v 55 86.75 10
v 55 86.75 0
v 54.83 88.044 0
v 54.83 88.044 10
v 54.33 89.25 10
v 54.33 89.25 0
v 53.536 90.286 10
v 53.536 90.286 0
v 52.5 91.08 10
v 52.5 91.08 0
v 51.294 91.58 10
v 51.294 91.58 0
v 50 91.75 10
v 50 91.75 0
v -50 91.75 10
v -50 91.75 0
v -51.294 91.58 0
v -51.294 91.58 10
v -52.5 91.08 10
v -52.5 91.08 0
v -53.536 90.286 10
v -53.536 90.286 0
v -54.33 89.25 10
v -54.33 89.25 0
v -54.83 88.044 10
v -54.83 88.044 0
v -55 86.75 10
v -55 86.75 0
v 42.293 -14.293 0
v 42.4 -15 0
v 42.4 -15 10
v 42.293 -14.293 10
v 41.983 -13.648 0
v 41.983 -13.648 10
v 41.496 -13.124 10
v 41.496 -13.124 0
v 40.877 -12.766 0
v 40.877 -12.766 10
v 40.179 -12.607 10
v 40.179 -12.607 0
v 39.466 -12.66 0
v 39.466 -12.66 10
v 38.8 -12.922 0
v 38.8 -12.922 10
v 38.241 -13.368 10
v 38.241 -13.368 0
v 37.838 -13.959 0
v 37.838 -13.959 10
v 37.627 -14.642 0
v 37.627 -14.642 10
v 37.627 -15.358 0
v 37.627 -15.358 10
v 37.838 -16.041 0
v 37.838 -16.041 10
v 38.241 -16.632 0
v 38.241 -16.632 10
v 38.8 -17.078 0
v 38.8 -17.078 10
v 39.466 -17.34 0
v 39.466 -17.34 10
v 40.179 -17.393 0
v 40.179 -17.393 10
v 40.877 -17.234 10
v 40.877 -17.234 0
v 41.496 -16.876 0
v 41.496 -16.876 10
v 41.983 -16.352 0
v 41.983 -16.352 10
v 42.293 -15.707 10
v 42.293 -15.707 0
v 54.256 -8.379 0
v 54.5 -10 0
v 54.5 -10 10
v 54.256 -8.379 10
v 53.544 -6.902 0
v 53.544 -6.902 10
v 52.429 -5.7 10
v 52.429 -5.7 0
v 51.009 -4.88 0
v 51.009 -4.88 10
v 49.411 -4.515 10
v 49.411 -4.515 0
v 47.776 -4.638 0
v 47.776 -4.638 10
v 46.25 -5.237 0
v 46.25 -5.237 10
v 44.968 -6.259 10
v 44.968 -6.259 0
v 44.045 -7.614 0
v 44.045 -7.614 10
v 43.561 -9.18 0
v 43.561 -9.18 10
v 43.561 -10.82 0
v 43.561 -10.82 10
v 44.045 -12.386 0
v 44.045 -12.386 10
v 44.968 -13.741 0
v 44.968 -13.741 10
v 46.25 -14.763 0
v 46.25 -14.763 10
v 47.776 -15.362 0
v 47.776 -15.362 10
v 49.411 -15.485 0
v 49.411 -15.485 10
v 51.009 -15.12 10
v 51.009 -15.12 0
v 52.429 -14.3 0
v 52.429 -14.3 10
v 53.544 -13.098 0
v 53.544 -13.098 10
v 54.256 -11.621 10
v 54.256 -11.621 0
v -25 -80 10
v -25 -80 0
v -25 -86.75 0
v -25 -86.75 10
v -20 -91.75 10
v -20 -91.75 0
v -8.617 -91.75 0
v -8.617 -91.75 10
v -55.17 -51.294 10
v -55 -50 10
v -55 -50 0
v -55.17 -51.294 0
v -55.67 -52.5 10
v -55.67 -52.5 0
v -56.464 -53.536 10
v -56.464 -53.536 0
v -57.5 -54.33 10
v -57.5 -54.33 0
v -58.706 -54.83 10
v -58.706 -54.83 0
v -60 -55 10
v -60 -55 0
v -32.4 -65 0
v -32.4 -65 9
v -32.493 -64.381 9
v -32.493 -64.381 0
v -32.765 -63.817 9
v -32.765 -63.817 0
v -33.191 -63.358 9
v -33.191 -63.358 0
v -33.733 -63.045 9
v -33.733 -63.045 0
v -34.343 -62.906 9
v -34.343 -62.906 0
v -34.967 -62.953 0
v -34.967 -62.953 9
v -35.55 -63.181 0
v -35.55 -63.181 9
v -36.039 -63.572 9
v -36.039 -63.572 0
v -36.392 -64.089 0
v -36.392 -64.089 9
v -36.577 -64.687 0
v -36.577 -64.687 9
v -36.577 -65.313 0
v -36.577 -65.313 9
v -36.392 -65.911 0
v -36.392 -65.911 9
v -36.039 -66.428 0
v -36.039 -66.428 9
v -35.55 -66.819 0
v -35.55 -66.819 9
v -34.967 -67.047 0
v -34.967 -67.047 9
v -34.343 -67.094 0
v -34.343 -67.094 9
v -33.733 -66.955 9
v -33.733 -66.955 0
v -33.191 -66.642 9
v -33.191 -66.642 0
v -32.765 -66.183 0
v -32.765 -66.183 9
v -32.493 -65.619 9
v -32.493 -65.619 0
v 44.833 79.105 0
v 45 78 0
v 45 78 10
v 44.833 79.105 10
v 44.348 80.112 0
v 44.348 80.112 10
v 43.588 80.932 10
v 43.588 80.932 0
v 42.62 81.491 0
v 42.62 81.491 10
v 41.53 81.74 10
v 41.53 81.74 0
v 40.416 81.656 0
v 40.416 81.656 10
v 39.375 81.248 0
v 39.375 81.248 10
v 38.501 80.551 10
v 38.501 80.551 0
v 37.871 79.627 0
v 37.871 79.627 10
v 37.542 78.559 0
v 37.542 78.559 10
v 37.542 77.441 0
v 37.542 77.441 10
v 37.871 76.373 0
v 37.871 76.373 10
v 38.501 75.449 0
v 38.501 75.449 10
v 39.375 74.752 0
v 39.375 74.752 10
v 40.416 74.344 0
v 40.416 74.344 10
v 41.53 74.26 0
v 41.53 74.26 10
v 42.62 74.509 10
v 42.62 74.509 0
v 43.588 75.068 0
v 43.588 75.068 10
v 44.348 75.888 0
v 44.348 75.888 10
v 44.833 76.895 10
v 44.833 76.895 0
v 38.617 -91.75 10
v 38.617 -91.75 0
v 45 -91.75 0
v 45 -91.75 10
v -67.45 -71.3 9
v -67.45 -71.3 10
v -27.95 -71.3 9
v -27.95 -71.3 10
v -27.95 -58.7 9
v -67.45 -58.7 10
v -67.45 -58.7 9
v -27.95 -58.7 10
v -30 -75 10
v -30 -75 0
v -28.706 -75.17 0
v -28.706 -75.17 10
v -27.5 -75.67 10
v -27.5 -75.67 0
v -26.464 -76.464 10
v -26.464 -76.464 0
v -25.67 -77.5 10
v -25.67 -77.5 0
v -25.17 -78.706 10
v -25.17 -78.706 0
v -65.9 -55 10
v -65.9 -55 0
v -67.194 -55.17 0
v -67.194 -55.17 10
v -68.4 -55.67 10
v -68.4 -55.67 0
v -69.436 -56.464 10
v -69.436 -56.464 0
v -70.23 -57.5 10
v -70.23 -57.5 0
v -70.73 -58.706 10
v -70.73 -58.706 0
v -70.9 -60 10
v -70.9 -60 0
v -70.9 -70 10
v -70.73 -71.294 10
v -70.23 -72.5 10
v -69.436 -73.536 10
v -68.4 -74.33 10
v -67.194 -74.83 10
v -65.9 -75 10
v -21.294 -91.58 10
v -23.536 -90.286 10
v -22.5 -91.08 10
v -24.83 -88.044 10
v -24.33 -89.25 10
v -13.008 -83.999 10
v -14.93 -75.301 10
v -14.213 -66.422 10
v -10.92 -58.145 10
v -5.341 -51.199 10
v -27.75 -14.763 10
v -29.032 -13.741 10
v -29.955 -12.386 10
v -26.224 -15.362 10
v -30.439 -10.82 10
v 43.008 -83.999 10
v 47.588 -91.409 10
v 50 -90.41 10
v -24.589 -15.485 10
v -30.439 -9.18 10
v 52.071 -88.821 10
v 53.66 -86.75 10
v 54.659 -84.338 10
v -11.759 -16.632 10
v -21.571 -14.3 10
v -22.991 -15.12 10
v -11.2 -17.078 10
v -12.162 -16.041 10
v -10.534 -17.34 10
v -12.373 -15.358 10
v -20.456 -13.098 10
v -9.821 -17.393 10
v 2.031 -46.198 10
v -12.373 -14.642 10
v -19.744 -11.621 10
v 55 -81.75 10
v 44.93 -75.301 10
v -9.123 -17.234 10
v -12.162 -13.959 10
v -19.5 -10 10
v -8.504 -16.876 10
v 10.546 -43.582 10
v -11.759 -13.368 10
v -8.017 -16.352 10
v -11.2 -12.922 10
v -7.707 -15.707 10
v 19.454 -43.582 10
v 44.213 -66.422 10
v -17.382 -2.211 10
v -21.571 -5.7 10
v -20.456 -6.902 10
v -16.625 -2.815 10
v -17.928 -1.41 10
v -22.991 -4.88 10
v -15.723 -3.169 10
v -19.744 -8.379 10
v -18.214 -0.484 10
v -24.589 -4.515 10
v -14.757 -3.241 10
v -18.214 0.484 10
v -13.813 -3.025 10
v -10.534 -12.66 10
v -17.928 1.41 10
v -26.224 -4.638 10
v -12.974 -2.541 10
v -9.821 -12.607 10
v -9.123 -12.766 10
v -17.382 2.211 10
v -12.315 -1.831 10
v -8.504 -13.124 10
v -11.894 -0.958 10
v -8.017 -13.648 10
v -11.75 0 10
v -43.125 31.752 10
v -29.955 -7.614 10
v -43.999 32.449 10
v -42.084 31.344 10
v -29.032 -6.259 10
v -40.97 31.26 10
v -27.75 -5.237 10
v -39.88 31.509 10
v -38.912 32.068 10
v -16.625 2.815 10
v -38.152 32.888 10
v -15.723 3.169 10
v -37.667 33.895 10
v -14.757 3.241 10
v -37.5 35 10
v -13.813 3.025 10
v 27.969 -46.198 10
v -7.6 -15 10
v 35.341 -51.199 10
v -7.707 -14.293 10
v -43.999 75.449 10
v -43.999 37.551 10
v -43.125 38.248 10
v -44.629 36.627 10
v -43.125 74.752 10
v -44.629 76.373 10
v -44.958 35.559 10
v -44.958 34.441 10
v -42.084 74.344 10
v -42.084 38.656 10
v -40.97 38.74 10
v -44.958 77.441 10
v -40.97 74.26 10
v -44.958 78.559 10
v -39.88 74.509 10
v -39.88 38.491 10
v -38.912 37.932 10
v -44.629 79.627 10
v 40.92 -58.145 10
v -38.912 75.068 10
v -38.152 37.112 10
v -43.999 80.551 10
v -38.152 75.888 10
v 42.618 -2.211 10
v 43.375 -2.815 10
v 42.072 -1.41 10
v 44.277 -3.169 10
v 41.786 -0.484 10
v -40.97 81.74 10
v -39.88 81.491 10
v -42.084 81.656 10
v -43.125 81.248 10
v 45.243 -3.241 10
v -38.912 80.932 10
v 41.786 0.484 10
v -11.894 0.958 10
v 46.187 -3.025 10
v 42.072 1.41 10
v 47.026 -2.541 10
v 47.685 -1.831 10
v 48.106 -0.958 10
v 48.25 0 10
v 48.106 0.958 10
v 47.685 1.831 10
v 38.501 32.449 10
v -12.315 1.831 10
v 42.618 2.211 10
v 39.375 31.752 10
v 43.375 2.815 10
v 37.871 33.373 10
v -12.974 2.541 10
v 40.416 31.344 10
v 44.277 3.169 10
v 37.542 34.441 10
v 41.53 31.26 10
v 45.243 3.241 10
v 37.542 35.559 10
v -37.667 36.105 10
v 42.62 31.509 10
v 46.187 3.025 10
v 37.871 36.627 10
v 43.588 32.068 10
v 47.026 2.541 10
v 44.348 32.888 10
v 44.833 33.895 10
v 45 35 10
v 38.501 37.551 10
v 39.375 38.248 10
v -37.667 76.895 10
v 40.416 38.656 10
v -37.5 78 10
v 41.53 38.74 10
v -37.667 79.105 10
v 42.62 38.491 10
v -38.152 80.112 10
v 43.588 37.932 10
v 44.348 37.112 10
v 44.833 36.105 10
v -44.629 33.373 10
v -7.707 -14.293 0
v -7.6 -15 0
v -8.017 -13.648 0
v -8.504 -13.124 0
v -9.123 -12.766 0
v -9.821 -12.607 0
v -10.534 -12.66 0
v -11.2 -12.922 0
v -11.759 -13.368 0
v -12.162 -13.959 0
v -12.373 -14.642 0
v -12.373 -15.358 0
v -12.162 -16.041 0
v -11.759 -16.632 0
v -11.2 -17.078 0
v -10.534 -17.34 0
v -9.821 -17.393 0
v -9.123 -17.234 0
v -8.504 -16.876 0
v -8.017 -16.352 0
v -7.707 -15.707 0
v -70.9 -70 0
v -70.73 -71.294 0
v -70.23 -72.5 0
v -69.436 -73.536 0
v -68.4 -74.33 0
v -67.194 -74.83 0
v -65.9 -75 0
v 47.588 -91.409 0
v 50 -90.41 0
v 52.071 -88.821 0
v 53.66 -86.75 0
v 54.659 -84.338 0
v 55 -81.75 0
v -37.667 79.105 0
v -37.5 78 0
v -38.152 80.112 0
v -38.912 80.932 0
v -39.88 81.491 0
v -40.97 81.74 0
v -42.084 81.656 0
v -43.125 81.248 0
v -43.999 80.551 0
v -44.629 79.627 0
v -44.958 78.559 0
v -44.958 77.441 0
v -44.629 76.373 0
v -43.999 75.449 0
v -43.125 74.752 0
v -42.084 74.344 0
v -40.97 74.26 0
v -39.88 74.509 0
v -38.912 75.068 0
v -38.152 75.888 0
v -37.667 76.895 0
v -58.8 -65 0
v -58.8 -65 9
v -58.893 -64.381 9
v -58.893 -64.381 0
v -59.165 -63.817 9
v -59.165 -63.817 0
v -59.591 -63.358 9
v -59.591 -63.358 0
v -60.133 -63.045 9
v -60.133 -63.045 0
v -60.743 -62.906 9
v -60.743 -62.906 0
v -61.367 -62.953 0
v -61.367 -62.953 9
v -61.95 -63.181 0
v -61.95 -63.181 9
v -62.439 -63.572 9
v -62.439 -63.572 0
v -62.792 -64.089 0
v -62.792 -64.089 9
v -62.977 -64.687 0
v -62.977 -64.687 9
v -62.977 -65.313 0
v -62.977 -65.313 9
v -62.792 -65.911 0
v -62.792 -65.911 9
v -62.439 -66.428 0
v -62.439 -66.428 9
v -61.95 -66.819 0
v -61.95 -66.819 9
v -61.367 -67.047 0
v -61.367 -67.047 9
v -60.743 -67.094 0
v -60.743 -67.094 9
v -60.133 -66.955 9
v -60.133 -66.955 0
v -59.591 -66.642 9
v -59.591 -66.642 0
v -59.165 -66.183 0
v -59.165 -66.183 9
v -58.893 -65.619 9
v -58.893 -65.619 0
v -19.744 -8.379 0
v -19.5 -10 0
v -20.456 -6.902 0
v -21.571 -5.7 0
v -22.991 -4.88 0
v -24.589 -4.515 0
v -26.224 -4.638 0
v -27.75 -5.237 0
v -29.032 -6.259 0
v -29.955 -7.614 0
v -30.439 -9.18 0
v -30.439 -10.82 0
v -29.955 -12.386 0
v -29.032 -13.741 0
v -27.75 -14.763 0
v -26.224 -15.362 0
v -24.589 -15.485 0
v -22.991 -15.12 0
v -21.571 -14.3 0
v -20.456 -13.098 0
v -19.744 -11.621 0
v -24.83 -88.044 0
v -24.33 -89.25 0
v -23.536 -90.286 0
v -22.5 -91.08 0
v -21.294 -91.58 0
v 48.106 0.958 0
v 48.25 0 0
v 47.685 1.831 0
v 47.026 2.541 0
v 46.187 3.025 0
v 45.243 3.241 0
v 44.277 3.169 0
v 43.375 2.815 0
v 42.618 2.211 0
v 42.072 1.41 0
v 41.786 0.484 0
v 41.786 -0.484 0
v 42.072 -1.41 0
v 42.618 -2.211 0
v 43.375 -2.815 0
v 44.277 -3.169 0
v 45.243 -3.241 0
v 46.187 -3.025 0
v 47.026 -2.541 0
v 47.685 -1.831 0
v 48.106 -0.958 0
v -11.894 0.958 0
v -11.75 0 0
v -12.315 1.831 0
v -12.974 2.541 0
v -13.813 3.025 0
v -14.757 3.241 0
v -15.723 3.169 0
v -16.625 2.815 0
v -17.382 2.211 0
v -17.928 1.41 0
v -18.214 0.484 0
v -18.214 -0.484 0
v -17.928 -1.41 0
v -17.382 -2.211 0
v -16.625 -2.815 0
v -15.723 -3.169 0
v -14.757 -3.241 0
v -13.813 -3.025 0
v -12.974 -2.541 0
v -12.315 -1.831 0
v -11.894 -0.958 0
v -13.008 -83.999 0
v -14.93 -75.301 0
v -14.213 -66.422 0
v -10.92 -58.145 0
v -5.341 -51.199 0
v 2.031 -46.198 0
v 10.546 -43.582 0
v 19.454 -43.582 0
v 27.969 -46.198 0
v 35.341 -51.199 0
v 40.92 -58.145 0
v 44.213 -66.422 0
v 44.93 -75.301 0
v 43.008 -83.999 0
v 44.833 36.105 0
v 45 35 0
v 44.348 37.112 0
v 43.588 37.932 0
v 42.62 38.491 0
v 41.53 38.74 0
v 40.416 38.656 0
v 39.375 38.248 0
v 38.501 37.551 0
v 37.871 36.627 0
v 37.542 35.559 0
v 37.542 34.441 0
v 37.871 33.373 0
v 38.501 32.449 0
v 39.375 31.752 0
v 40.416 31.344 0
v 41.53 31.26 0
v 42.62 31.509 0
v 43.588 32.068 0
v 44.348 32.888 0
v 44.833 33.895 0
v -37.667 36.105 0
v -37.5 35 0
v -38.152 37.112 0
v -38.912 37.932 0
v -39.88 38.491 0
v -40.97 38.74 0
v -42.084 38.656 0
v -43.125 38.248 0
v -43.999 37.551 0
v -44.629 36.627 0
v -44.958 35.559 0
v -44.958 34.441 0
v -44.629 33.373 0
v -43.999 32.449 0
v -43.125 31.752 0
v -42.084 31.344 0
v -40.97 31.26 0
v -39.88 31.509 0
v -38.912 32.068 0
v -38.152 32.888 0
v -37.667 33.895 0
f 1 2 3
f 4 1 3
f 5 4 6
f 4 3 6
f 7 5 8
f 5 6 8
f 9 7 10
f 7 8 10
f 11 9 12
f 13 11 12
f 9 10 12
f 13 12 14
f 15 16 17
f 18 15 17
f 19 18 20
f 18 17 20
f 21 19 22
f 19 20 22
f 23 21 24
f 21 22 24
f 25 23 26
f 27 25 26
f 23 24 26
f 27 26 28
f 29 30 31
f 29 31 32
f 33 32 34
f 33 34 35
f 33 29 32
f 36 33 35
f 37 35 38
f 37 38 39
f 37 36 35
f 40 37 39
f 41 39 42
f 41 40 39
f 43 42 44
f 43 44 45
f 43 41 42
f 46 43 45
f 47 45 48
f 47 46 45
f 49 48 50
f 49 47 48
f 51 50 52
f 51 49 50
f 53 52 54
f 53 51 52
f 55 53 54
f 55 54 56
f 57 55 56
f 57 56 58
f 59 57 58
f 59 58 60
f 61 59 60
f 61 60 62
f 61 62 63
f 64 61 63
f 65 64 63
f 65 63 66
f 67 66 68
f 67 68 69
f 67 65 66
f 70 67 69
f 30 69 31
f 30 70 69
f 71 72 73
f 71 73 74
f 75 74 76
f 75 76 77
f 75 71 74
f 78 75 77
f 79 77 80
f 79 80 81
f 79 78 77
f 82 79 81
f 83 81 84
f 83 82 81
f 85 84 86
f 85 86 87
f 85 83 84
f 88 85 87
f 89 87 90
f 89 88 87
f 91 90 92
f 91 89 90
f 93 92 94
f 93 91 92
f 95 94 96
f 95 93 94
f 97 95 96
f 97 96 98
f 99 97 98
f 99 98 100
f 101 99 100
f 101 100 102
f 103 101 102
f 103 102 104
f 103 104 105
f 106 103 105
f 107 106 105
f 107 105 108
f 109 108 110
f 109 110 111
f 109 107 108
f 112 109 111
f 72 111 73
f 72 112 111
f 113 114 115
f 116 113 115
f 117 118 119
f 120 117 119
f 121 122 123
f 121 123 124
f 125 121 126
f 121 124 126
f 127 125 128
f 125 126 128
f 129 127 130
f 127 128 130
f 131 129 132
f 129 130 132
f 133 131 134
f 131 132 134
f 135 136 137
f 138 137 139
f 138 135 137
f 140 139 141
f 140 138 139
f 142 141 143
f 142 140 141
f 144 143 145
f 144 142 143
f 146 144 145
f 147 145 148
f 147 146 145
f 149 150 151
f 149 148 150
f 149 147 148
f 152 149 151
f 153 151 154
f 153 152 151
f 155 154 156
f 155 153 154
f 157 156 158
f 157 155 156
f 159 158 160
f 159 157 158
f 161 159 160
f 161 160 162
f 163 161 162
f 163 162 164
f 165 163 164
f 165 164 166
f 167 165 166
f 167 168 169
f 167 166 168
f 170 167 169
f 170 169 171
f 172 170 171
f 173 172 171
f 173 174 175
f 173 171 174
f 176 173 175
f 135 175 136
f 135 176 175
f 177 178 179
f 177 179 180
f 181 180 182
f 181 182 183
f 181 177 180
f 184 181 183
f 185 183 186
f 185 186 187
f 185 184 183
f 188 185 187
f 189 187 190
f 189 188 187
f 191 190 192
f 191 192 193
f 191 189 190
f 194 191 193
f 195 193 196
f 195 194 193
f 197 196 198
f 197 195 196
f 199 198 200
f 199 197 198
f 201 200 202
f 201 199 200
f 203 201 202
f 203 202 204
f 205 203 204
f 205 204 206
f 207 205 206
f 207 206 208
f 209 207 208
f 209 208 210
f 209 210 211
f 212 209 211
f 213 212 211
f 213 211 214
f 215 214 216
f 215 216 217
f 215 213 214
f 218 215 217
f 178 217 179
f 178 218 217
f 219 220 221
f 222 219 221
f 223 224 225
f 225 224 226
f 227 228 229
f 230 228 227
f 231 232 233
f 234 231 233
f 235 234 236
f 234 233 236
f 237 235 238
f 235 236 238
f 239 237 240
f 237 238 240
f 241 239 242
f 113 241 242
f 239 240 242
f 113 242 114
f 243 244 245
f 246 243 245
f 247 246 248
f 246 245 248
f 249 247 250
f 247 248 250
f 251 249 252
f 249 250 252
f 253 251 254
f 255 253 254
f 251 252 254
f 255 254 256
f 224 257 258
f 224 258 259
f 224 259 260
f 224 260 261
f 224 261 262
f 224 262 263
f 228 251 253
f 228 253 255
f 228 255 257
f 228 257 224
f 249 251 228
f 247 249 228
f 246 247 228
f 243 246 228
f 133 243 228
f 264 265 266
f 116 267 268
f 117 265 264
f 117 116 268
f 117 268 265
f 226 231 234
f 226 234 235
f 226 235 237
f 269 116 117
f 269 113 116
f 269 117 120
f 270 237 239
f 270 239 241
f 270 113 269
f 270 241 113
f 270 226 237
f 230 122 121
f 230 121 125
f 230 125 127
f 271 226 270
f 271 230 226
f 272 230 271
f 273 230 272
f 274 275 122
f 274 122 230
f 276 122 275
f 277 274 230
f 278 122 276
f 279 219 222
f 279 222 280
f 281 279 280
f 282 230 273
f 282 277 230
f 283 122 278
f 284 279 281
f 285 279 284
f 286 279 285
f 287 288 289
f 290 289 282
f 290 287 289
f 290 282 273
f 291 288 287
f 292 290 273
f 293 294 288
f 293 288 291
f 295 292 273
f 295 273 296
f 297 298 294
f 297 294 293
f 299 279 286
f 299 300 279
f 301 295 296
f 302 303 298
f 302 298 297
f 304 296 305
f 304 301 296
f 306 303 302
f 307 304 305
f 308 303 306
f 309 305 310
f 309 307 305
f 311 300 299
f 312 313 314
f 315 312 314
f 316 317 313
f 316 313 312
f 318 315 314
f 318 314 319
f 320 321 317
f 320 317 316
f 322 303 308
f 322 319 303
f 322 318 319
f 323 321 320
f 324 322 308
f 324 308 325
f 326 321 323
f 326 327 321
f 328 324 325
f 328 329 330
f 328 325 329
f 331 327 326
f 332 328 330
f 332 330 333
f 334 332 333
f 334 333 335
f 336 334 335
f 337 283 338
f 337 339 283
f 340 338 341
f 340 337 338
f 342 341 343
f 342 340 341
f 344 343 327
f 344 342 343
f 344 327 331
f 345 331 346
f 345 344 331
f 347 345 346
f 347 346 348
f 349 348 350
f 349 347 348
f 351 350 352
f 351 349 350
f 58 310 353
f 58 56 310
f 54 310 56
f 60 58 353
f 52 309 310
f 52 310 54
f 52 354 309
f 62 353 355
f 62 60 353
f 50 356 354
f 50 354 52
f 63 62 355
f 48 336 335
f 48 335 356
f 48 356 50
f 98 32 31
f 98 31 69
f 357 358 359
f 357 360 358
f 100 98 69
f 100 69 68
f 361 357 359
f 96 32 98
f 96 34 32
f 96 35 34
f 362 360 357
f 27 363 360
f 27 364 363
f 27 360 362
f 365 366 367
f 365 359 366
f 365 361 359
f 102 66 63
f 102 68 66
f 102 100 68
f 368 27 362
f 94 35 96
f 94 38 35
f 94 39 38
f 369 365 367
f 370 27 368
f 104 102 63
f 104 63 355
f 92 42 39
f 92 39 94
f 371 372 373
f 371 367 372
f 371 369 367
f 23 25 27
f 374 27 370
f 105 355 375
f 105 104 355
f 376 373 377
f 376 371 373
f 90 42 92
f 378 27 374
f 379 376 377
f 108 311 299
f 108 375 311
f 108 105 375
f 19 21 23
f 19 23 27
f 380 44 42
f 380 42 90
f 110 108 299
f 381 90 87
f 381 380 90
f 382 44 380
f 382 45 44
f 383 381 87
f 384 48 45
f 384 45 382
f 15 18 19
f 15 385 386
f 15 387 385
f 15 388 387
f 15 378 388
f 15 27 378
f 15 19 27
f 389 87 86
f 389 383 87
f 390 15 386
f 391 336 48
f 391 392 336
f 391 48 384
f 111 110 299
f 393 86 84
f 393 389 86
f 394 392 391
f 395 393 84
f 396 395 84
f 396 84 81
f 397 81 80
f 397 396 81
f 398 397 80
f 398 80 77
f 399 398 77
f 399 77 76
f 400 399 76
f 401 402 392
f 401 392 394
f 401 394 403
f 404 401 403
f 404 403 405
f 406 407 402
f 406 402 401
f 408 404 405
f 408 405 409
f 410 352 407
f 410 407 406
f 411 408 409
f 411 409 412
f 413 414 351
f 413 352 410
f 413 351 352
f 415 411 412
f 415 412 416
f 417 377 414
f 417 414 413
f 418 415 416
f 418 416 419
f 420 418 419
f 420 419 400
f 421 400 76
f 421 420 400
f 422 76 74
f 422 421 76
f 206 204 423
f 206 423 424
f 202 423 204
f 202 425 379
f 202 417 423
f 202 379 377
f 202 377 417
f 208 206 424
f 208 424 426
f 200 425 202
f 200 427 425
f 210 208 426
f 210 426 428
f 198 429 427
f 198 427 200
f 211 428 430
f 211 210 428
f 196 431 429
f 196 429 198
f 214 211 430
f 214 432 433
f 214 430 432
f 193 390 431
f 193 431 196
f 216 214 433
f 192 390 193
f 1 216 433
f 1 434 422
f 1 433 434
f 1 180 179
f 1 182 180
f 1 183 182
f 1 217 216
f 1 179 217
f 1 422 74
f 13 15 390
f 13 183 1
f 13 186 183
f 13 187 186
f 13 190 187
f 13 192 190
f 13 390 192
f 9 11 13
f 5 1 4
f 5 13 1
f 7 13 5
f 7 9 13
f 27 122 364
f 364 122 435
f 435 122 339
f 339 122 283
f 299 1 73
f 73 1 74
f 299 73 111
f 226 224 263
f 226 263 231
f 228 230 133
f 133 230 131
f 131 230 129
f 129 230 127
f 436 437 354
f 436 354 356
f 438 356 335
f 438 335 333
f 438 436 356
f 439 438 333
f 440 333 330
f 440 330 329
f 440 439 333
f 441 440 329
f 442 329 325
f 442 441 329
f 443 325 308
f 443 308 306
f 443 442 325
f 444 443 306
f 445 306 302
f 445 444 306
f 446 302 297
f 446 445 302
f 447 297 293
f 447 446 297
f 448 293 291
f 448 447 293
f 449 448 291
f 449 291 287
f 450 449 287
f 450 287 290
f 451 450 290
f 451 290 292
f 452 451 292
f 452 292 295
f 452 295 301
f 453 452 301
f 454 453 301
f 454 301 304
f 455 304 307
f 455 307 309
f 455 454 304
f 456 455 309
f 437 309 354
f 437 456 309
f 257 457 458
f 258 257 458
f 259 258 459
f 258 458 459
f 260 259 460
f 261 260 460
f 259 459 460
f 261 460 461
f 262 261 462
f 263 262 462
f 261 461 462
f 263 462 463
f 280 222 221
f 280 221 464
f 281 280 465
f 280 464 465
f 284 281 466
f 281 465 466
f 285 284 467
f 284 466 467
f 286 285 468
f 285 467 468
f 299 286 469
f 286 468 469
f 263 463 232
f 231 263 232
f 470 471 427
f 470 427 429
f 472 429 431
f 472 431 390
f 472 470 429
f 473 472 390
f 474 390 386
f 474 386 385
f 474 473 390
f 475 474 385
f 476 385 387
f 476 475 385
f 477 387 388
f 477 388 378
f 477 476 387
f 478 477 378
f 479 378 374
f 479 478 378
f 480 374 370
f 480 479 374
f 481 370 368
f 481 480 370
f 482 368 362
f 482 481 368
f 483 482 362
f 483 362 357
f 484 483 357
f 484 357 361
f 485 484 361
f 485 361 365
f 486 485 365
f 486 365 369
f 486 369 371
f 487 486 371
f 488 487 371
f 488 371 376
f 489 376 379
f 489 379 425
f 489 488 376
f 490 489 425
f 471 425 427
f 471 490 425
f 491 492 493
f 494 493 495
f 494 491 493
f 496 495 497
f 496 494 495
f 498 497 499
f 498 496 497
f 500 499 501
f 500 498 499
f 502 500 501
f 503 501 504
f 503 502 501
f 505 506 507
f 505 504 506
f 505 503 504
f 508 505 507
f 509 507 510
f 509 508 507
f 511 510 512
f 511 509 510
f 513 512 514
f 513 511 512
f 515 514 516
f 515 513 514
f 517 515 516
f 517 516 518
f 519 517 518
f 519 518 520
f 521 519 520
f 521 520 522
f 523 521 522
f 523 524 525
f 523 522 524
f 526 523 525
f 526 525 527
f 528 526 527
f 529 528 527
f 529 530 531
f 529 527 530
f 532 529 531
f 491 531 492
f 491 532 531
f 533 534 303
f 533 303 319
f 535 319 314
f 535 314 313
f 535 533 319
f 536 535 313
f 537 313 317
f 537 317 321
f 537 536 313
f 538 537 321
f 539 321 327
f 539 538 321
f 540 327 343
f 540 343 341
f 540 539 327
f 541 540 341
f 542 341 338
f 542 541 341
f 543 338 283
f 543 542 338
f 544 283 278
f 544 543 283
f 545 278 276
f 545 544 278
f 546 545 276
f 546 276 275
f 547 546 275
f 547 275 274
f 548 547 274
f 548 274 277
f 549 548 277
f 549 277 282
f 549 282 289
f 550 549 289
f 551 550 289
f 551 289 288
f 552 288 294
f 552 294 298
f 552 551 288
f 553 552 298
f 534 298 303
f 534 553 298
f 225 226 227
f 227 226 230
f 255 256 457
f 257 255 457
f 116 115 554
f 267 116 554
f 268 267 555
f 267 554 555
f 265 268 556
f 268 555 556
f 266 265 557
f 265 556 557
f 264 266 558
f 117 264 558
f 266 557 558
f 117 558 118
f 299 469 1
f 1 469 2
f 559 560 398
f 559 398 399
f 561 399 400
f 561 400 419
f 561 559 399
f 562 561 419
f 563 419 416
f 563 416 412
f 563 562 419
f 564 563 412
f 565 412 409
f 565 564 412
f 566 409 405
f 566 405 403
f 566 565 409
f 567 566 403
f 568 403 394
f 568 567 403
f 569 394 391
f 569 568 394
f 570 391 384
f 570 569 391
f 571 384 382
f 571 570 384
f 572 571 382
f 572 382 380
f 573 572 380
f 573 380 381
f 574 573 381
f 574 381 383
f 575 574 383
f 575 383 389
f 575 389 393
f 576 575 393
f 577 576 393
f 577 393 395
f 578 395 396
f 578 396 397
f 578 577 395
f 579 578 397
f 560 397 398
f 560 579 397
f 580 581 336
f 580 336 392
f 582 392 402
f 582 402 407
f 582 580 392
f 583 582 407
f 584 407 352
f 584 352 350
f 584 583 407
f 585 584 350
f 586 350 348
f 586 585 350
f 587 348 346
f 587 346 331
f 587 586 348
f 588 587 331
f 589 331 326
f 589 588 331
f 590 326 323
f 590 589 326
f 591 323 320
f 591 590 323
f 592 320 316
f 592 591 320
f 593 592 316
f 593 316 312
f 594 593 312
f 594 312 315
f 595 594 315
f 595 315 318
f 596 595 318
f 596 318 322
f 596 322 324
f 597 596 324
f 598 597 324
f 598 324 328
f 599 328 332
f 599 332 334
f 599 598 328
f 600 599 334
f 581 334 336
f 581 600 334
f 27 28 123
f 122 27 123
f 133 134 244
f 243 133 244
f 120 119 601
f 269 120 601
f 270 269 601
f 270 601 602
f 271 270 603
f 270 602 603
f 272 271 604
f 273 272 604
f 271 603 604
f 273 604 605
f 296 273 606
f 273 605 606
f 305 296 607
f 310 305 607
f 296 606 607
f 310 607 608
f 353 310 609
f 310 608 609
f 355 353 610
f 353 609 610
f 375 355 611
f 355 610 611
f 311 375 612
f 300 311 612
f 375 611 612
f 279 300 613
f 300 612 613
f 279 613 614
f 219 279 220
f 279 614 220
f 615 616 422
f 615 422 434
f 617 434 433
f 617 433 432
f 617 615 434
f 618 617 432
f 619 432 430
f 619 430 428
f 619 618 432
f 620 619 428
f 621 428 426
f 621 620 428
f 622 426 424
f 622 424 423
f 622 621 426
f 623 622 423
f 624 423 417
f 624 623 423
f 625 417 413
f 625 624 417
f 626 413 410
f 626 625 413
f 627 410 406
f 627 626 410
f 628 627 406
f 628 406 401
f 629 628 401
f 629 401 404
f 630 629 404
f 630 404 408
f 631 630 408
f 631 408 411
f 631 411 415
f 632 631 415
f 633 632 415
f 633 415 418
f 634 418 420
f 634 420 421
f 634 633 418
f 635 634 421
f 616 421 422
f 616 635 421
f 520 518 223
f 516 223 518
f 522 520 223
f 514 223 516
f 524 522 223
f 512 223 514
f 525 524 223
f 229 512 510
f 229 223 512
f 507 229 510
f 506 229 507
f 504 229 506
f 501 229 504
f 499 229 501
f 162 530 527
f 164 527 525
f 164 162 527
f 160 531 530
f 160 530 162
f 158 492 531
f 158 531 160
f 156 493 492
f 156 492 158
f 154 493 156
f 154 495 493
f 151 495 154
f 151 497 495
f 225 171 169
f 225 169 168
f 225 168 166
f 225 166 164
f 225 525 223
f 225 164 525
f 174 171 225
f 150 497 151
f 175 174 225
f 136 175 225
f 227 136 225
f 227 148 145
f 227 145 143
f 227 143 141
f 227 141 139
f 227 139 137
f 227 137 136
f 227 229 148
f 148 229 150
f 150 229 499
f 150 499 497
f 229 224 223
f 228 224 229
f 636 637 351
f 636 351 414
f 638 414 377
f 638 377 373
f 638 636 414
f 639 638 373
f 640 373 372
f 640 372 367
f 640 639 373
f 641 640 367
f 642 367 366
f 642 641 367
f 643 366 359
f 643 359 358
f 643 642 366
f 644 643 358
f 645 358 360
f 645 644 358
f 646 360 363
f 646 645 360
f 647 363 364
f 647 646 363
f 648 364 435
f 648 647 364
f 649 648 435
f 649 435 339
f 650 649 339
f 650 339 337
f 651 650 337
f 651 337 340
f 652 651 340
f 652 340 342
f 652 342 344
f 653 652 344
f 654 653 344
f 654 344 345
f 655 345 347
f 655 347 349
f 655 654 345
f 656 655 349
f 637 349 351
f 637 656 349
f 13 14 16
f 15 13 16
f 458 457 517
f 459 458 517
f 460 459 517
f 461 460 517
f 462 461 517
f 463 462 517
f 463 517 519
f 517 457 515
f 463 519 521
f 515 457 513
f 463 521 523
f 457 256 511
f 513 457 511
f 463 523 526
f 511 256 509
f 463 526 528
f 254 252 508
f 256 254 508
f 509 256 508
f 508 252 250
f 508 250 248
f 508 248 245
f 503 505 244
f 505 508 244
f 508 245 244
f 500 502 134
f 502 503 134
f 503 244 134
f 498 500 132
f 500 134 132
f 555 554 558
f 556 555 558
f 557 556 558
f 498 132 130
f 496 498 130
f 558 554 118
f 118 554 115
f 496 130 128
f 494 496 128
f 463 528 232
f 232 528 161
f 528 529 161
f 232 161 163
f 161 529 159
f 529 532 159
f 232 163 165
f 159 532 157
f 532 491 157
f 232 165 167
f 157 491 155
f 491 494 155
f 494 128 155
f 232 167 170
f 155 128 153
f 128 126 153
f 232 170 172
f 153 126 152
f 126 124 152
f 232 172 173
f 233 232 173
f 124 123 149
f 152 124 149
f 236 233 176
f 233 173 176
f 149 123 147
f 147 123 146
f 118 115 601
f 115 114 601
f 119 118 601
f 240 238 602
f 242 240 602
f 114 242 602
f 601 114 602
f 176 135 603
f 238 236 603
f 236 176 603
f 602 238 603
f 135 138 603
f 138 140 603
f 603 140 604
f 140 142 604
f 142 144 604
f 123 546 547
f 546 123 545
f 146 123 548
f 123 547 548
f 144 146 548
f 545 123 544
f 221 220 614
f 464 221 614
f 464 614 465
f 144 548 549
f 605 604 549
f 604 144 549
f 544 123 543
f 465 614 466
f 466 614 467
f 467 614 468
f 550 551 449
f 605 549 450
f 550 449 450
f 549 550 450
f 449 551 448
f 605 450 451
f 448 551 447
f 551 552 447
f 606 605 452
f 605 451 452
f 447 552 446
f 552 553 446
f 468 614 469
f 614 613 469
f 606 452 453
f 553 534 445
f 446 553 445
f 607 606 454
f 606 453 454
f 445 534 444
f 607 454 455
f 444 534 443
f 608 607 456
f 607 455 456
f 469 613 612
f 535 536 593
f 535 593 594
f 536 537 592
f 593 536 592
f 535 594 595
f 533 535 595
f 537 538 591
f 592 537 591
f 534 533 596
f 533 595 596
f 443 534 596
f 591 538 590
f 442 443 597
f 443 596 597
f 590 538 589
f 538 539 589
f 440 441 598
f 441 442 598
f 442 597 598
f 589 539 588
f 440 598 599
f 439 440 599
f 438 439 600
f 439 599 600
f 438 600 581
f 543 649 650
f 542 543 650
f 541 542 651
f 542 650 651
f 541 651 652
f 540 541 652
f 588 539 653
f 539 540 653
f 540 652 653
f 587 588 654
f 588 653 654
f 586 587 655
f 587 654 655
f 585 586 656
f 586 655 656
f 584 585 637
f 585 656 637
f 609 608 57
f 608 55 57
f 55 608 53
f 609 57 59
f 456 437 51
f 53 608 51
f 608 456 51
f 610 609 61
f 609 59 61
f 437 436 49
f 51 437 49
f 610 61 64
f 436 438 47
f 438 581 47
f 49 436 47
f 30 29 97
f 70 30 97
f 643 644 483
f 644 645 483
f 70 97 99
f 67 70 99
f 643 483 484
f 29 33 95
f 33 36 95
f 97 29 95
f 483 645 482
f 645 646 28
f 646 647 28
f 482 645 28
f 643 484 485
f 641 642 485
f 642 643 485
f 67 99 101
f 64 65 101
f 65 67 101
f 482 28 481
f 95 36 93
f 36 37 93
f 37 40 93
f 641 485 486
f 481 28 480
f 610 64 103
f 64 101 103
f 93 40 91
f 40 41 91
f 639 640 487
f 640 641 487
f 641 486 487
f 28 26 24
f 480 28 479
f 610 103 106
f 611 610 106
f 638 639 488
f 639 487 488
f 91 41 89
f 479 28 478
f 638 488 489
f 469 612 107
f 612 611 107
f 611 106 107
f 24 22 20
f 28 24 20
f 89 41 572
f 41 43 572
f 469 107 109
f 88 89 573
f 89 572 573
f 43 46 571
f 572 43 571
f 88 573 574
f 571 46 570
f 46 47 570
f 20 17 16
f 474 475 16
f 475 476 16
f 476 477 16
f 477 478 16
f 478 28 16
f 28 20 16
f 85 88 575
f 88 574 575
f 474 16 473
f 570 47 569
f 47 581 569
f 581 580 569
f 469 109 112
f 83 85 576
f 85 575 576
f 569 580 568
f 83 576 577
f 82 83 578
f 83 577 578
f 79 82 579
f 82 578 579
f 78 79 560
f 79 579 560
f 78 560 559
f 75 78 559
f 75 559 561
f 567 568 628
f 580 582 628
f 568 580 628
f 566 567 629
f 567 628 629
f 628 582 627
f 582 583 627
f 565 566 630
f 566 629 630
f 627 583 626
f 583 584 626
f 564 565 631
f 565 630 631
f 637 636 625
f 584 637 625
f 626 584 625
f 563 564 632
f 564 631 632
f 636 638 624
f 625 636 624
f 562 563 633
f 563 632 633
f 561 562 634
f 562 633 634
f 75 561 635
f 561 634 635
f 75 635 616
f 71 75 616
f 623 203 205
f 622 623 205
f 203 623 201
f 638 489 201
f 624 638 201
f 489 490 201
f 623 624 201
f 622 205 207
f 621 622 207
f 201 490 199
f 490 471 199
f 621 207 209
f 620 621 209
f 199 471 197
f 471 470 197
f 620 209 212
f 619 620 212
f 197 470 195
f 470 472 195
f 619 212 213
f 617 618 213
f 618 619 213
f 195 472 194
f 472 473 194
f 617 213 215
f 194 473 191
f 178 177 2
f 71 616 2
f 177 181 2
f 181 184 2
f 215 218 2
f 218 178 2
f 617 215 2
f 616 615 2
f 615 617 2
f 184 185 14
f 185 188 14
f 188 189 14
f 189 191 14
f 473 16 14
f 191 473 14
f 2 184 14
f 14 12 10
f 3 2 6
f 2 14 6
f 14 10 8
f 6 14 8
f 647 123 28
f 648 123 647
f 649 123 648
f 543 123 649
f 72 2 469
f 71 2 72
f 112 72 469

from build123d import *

# Parameters (mm, degrees)
F0_R     = 2.1
F0_R_2   = 5.5
F0_R_3   = 2.4
F0_R_4   = 3.75
F0_R_5   = 3.25
F1_DEPTH = 10
F2_W     = 39.5
F2_H     = 12.6
F2_R     = 2.074687
F2_R_2   = 2.038572
F3_DEPTH = 1


with BuildPart() as f1:
    # F0 (on Top) → F1 (new body)
    with BuildSketch(Plane.XY):
        with BuildLine():
            ThreePointArc((55, 86.75), (53.535534, 90.285534), (50, 91.75))
            Line((50, 91.75), (-50, 91.75))
            ThreePointArc((-50, 91.75), (-53.535534, 90.285534), (-55, 86.75))
            Line((-55, 86.75), (-55, -50))
            ThreePointArc((-55, -50), (-56.464466, -53.535534), (-60, -55))
            Line((-60, -55), (-65.9, -55))
            ThreePointArc((-65.9, -55), (-69.435534, -56.464466), (-70.9, -60))
            Line((-70.9, -60), (-70.9, -70))
            ThreePointArc((-70.9, -70), (-69.435534, -73.535534), (-65.9, -75))
            Line((-65.9, -75), (-60, -75))
            Line((-60, -75), (-30, -75))
            ThreePointArc((-30, -75), (-26.464466, -76.464466), (-25, -80))
            Line((-25, -80), (-25, -86.75))
            ThreePointArc((-25, -86.75), (-23.535534, -90.285534), (-20, -91.75))
            Line((-20, -91.75), (-8.616731, -91.75))
            ThreePointArc((-8.616731, -91.75), (15, -43.25), (38.616731, -91.75))
            Line((38.616731, -91.75), (45, -91.75))
            ThreePointArc((45, -91.75), (52.071068, -88.821068), (55, -81.75))
            Line((55, -81.75), (55, -68.25))
            Line((55, -68.25), (55, 86.75))
        make_face()
        with Locations((-60.9, -65)):
            Circle(F0_R, mode=Mode.SUBTRACT)
        with Locations((-34.5, -65)):
            Circle(F0_R, mode=Mode.SUBTRACT)
        with Locations((-25, -10)):
            Circle(F0_R_2, mode=Mode.SUBTRACT)
        with Locations((-10, -15)):
            Circle(F0_R_3, mode=Mode.SUBTRACT)
        with Locations((40, -15)):
            Circle(F0_R_3, mode=Mode.SUBTRACT)
        with Locations((49, -10)):
            Circle(F0_R_2, mode=Mode.SUBTRACT)
        with Locations((-41.25, 35)):
            Circle(F0_R_4, mode=Mode.SUBTRACT)
        with Locations((-15, 0)):
            Circle(F0_R_5, mode=Mode.SUBTRACT)
        with Locations((-41.25, 78)):
            Circle(F0_R_4, mode=Mode.SUBTRACT)
        with Locations((45, 0)):
            Circle(F0_R_5, mode=Mode.SUBTRACT)
        with Locations((41.25, 35)):
            Circle(F0_R_4, mode=Mode.SUBTRACT)
        with Locations((41.25, 78)):
            Circle(F0_R_4, mode=Mode.SUBTRACT)
    extrude(amount=F1_DEPTH)

    # F2 (on face) → F3 (cut)
    with BuildSketch(Plane.XY.offset(10)):
        with Locations((-47.7, -65)):
            Rectangle(F2_W, F2_H)
        with Locations((-60.9, -65)):
            Circle(F2_R, mode=Mode.SUBTRACT)
        with Locations((-34.5, -65)):
            Circle(F2_R_2, mode=Mode.SUBTRACT)
    extrude(amount=-F3_DEPTH, mode=Mode.SUBTRACT)


solid = f1.part
